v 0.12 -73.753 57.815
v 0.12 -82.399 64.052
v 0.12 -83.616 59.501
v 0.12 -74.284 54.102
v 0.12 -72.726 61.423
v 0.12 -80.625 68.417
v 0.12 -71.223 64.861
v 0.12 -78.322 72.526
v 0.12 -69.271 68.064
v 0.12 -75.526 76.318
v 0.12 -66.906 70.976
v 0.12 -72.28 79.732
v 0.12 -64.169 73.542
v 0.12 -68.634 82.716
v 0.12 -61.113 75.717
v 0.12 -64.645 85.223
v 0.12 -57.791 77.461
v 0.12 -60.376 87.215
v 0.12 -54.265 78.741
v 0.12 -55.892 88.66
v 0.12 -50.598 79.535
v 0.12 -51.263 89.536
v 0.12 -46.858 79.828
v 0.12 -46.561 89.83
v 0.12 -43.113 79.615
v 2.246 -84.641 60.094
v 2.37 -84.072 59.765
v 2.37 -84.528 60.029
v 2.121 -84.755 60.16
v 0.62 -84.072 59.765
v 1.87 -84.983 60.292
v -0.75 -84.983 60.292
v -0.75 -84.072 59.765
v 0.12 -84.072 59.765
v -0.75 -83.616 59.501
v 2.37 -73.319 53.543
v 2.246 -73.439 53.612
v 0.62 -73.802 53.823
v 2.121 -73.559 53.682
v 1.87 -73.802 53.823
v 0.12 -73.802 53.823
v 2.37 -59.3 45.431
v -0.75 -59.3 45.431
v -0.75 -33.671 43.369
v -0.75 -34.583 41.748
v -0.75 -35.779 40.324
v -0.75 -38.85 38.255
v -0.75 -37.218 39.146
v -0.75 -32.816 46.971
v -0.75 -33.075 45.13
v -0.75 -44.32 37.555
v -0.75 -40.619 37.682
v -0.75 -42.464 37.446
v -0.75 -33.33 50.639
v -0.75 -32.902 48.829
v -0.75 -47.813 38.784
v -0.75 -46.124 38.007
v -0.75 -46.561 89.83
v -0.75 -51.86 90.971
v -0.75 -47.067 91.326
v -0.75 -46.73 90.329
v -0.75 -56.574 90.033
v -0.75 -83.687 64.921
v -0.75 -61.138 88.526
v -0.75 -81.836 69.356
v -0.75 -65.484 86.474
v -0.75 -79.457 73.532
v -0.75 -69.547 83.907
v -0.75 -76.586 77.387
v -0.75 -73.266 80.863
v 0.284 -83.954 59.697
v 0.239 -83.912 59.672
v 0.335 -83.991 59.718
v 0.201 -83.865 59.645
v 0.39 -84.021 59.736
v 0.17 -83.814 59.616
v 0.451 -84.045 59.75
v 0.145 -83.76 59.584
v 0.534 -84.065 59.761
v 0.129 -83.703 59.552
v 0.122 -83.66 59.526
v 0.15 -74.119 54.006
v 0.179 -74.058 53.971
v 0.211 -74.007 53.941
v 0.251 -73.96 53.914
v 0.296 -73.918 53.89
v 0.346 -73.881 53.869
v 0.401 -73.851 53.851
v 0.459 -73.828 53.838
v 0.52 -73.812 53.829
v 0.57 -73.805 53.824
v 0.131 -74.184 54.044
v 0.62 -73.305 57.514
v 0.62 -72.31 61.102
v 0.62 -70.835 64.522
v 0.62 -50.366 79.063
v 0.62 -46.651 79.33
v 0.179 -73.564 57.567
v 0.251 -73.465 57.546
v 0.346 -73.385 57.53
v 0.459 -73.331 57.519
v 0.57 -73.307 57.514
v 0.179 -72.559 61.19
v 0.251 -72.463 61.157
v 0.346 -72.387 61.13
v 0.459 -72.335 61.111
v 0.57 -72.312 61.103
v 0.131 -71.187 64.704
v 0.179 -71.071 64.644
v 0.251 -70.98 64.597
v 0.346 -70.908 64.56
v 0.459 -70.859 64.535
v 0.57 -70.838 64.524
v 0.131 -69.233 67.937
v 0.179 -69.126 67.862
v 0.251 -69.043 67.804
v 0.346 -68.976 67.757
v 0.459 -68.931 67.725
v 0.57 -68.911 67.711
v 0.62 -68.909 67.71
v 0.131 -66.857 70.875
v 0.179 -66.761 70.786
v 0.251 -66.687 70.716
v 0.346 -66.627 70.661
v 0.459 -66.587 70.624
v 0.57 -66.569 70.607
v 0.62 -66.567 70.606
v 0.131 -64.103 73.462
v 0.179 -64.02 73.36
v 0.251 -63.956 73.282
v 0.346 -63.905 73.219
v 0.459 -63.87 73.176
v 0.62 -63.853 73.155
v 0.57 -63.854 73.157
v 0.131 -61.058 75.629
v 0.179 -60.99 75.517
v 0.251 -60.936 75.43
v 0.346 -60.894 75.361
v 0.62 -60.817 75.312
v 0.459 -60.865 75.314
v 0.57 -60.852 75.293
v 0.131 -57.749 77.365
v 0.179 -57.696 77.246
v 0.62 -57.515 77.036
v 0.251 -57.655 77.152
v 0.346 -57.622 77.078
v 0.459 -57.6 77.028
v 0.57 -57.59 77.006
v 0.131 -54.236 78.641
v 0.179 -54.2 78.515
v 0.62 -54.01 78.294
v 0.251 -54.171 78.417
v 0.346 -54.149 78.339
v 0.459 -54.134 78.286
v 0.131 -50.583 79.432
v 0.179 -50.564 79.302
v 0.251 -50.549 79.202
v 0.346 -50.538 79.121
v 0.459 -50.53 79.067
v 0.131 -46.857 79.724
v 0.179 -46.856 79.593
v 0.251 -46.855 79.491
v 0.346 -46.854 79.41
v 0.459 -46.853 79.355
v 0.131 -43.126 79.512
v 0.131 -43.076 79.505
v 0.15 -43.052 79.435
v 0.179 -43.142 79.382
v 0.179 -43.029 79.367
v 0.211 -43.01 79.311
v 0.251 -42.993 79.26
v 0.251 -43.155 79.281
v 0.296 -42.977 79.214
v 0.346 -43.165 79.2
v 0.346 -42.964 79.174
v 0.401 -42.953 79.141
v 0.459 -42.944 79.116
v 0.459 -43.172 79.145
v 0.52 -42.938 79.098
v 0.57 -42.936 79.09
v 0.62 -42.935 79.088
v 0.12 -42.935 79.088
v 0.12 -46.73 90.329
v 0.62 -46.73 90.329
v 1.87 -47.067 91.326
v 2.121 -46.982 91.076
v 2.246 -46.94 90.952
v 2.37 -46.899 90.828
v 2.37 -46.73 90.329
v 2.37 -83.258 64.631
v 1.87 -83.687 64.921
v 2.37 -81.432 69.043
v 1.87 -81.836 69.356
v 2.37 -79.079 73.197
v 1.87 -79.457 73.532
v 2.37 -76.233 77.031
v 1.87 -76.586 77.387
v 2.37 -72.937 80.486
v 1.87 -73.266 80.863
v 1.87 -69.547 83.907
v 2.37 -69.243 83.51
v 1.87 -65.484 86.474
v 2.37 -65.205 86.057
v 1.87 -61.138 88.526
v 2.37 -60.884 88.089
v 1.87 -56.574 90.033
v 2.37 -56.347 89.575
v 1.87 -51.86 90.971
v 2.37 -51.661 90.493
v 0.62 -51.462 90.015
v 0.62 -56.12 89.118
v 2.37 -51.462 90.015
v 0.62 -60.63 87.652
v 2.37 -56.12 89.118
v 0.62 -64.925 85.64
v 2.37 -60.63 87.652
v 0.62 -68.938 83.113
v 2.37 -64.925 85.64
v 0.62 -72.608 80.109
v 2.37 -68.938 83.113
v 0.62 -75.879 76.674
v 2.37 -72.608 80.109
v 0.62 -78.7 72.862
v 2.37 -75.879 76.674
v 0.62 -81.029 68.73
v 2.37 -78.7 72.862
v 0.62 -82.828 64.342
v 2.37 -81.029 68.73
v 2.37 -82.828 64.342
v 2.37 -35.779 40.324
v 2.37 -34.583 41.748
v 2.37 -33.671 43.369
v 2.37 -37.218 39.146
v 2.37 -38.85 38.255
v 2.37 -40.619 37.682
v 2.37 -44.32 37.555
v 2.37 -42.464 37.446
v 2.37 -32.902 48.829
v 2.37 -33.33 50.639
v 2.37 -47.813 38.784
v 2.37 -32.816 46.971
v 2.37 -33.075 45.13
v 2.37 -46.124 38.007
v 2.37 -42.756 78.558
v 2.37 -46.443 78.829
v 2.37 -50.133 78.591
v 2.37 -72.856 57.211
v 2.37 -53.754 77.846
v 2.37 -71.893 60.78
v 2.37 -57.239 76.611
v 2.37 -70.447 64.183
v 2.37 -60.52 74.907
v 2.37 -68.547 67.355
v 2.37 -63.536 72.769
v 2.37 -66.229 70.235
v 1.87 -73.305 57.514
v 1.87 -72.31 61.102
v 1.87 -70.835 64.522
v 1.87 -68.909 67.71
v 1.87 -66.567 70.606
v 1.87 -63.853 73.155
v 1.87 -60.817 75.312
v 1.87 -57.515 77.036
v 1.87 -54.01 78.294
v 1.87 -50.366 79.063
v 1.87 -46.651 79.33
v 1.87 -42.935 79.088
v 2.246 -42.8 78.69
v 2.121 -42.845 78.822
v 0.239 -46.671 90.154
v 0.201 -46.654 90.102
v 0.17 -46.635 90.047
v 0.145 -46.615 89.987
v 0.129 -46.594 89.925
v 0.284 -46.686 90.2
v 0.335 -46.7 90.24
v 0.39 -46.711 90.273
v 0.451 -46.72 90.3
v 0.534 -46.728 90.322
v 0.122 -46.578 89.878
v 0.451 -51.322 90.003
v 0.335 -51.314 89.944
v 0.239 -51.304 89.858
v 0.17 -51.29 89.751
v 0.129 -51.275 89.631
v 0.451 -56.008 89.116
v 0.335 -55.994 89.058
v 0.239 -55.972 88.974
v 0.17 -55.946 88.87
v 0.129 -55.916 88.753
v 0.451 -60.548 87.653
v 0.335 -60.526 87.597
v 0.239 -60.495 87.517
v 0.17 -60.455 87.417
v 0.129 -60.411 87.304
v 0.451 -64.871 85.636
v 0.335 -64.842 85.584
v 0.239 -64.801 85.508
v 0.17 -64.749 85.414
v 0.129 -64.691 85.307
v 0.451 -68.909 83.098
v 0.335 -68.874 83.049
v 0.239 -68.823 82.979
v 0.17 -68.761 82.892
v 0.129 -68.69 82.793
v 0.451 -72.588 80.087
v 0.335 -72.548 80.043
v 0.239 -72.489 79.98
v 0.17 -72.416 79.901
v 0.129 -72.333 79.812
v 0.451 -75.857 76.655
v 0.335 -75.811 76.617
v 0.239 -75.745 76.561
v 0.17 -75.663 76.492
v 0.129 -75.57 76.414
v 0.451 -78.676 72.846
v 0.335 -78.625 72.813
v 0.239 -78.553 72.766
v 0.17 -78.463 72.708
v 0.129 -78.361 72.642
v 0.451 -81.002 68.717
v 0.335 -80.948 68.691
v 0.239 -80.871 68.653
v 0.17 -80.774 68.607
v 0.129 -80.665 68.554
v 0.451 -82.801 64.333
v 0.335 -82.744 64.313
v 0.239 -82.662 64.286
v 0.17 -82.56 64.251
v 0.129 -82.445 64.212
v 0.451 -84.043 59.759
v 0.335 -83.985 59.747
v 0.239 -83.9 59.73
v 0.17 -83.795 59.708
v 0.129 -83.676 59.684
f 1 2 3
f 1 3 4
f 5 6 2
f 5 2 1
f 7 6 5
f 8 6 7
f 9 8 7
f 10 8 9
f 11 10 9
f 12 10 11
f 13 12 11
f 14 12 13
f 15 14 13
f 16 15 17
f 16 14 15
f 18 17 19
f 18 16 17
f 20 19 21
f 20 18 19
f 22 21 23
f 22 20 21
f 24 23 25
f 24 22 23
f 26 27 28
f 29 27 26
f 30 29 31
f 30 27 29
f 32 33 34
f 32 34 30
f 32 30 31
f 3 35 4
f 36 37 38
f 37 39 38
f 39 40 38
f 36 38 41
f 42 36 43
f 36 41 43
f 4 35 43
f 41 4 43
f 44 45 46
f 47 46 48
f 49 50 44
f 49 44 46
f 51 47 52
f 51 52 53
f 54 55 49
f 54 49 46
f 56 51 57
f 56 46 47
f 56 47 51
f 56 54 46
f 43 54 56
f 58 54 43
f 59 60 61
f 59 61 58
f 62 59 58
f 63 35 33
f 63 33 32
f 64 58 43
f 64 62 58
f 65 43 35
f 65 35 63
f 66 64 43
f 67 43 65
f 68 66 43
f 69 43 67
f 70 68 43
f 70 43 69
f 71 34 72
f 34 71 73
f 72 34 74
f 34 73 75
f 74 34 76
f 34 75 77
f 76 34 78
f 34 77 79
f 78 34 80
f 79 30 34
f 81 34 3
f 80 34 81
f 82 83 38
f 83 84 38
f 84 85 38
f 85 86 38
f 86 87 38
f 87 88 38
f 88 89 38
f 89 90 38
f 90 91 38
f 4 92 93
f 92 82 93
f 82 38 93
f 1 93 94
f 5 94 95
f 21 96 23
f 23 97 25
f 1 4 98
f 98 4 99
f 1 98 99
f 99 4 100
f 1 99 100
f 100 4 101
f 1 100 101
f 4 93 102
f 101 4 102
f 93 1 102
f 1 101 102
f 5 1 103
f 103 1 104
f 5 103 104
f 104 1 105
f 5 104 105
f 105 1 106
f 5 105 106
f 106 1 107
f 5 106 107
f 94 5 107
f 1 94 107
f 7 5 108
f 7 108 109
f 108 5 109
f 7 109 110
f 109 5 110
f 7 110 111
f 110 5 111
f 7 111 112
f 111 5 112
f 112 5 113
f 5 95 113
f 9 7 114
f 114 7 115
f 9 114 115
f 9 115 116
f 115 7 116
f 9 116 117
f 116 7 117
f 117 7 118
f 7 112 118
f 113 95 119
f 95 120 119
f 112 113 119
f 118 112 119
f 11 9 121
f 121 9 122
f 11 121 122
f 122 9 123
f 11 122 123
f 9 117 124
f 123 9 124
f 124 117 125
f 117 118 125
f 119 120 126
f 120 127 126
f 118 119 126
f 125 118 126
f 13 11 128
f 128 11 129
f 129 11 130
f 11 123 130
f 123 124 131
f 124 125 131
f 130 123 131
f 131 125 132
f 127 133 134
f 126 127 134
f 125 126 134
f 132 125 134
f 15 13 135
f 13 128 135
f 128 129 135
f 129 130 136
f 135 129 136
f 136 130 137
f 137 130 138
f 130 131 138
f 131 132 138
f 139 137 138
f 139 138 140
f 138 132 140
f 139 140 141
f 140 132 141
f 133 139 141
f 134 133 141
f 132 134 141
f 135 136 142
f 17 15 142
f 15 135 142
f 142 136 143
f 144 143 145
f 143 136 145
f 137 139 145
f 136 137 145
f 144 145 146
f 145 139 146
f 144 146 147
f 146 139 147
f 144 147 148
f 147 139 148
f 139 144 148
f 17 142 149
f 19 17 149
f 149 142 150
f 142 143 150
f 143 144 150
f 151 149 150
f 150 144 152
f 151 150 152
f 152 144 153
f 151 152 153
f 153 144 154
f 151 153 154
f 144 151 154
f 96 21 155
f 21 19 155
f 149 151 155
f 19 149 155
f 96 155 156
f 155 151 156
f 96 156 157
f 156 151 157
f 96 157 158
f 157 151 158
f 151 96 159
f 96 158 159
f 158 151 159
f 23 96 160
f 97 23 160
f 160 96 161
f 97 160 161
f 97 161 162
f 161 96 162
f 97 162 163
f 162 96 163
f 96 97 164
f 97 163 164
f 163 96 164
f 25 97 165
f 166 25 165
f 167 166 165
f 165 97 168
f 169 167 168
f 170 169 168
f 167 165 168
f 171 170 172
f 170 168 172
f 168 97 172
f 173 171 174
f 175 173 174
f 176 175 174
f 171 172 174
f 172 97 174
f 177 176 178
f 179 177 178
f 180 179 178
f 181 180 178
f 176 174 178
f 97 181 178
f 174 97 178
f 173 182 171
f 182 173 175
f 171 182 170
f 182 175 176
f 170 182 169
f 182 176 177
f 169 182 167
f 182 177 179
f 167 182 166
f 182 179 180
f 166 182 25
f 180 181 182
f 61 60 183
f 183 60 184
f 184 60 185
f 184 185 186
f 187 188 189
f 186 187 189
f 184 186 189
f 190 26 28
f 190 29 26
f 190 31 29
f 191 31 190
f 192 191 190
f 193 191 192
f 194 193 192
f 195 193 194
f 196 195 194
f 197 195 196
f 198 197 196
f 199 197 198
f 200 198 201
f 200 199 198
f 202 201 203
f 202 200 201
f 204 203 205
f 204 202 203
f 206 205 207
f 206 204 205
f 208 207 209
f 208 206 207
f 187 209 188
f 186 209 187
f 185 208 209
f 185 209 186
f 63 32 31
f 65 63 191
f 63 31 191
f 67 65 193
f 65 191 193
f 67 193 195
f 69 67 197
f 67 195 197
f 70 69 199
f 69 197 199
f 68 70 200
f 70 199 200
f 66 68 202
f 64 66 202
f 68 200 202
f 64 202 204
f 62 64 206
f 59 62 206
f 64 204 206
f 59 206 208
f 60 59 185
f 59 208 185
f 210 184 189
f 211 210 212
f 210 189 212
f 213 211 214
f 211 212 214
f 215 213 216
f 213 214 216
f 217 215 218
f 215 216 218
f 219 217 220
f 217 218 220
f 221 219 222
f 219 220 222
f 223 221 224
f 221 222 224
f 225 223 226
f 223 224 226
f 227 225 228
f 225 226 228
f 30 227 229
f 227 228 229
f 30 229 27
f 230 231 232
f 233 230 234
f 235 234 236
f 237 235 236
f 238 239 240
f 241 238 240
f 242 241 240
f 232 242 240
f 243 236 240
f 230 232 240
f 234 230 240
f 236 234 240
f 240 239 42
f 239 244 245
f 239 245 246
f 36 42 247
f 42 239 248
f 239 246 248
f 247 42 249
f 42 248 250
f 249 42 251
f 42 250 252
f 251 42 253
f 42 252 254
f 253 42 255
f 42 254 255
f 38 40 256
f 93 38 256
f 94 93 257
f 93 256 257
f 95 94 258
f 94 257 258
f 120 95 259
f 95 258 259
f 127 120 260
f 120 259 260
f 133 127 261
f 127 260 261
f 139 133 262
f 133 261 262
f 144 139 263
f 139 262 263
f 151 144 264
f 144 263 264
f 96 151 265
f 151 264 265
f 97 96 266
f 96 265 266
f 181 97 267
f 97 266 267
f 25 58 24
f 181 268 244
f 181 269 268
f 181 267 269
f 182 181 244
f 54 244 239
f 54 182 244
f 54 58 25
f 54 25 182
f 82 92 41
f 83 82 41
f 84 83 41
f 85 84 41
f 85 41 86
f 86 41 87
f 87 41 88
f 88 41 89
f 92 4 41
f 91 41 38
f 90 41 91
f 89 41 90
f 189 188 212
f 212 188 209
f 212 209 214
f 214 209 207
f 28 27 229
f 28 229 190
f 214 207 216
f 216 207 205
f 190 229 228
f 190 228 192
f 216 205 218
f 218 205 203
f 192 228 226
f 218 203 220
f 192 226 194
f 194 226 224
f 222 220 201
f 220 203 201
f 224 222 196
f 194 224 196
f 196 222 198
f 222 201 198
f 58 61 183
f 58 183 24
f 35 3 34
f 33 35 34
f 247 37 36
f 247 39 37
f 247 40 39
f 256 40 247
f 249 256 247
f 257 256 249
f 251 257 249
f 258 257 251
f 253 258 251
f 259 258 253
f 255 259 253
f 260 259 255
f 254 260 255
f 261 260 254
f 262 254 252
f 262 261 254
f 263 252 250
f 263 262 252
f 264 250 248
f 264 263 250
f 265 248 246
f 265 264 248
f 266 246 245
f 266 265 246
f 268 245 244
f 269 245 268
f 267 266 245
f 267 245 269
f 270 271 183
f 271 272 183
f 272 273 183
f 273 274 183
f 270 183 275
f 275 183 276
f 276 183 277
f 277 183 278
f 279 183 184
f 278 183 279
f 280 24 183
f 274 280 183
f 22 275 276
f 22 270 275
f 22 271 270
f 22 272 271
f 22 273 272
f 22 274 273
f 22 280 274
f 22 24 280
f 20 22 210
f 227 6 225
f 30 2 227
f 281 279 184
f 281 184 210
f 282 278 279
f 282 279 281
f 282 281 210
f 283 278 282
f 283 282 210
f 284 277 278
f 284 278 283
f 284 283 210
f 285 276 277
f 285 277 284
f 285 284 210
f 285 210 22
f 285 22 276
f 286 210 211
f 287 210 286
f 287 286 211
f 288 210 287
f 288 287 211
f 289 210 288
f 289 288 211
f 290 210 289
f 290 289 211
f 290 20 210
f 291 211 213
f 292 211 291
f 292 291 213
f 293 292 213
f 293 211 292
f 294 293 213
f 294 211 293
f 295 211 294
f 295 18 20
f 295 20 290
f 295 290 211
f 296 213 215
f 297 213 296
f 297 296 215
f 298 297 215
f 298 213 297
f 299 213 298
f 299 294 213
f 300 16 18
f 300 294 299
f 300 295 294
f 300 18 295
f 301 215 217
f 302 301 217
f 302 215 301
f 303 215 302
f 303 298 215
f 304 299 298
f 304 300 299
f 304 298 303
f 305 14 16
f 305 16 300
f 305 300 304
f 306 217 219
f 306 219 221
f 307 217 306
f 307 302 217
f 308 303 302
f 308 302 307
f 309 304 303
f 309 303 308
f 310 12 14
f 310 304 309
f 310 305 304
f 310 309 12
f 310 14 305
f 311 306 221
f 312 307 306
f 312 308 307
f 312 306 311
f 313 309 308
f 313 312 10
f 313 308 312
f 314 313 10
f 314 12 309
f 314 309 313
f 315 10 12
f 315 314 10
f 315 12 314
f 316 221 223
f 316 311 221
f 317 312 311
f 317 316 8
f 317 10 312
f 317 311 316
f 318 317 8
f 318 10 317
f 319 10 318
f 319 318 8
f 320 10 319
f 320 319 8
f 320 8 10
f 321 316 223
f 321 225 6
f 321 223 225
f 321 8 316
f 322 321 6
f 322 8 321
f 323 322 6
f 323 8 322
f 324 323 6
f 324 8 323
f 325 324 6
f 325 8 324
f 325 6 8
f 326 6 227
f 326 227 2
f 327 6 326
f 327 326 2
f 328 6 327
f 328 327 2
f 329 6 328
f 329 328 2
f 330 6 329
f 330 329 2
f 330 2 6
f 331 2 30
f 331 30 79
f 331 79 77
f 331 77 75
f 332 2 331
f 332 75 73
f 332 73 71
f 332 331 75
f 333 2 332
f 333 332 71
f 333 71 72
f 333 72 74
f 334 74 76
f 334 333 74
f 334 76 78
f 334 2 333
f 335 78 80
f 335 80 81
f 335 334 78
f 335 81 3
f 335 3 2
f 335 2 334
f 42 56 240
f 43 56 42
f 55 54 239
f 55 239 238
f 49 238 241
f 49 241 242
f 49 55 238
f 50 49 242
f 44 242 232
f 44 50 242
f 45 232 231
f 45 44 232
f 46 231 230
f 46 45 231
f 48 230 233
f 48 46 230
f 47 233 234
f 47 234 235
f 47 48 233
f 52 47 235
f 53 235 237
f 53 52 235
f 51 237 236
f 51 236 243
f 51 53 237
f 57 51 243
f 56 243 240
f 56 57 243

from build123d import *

# Parameters (mm, degrees)
F1_DEPTH     = 2.37
F3_DEPTH     = 2.37
F5_DEPTH     = 2.25
F6_DEPTH     = 0.75
F7_SIZE      = 0.5
F8_T4_ANGLE  = 81.836383008
F8_T10_ANGLE = 99.1168662244
F10_DEPTH    = 3.12


# Not quite as in the source:
# - a fillet or chamfer that OpenCascade refuses, or shapes differently, is made with other operations: its cross-section is extruded or revolved along the edge and cut away or added


with BuildPart() as f1:
    # F0 (on Right) → F1 (new body)
    with BuildSketch(Plane.YZ):
        with BuildLine():
            ThreePointArc((-46.5614527995, 89.8296507657), (-59.272592692, 87.6283434753), (-70.5032497848, 81.2808106933))
            Line((-70.5032497848, 81.2808106933), (-46.5614527995, 52.0296507657))
            Line((-46.5614527995, 52.0296507657), (-42.2863249385, 46.8064651858))
            ThreePointArc((-42.2863249385, 46.8064651858), (-37.3697308445, 54.2738686288), (-37.5751261635, 63.2121472344))
            Line((-37.5751261635, 63.2121472344), (-46.5614527995, 89.8296507657))
        make_face()
        with BuildLine():
            Line((-46.5614527995, 52.0296507657), (-70.5032497848, 81.2808106933))
            ThreePointArc((-70.5032497848, 81.2808106933), (-78.9453750126, 71.5263577209), (-83.6157032002, 59.501098232))
            Line((-83.6157032002, 59.501098232), (-59.2995451707, 45.4309163095))
            ThreePointArc((-59.2995451707, 45.4309163095), (-50.5782061954, 43.4628568222), (-42.2863249385, 46.8064651858))
            Line((-42.2863249385, 46.8064651858), (-46.5614527995, 52.0296507657))
        make_face()
    extrude(amount=F1_DEPTH)

    # F2 (on face) → F3 (join)
    with BuildSketch(Plane(origin=(0, 0, 0), x_dir=(0, -1, 0), z_dir=(-1, 0, 0))):
        with BuildLine():
            ThreePointArc((84.0721339402, 59.7652050675), (70.8199402211, 81.6677307982), (46.7301322311, 90.3292793181))
            Line((46.7301322311, 90.3292793181), (46.5614527995, 89.8296507657))
            ThreePointArc((46.5614527995, 89.8296507657), (70.5032497848, 81.2808106933), (83.6157032002, 59.501098232))
            Line((83.6157032002, 59.501098232), (84.0721339402, 59.7652050675))
        make_face()
        with BuildLine():
            ThreePointArc((84.9830454985, 60.2922904452), (71.4533210937, 82.4415710079), (47.0667704776, 91.3264019551))
            Line((47.0667704776, 91.3264019551), (46.7301322311, 90.3292793181))
            ThreePointArc((46.7301322311, 90.3292793181), (70.8199402211, 81.6677307982), (84.0721339402, 59.7652050675))
            Line((84.0721339402, 59.7652050675), (84.9830454985, 60.2922904452))
        make_face()
    extrude(amount=-F3_DEPTH)

    # F4 (on face) → F5 (cut)
    with BuildSketch(Plane.YZ.offset(2.37)):
        with BuildLine():
            ThreePointArc((-73.802497152, 53.8228330154), (-63.8527506222, 73.1554884912), (-42.9348652938, 79.0876969454))
            Line((-42.9348652938, 79.0876969454), (-46.7301322311, 90.3292793181))
            ThreePointArc((-46.7301322311, 90.3292793181), (-70.8199402211, 81.6677307982), (-84.0721339402, 59.7652050675))
            Line((-84.0721339402, 59.7652050675), (-73.802497152, 53.8228330154))
        make_face()
    extrude(amount=-F5_DEPTH, mode=Mode.SUBTRACT)

    # F6 (add): a face of the model
    f6_faces = [f1.faces().sort_by_distance(p)[0] for p in [
        (0, -58.3598378742, 66.4444605195),
    ]]
    extrude(f6_faces, amount=F6_DEPTH)

    # F7
    f7_edges = [f1.edges().sort_by_distance(p)[0] for p in [
        (2.37, -71.453321, 82.441571),
        (2.37, -63.852751, 73.155488),
    ]]
    chamfer(f7_edges, length=F7_SIZE)

    # F8: fillet of radius 0.5 on 2 edges, made by hand


with BuildPart() as f8_tool2:
    # F8_s3 → F8_t4 (revolve)
    with BuildSketch(Plane(origin=(0, -47.9930028953, 1.3558158365), x_dir=(1, 0, 0), z_dir=(0, 0.9996011995, -0.0282390152))):
        with BuildLine():
            ThreePointArc((0.62, -88.9940517429), (0.2664466094, -88.8476051335), (0.12, -88.4940517429))
            Line((0.12, -88.4940517429), (0.12, -88.9940517429))
            Line((0.12, -88.9940517429), (0.62, -88.9940517429))
        make_face()
    revolve(axis=Axis((0.12, -46.5614527995, 52.0296507657), (1, 0, 0)), revolution_arc=F8_T4_ANGLE)

    split(bisect_by=Plane(origin=(0, 4.8196318055, 8.3293115378), x_dir=(1, 0, 0), z_dir=(0, 0.5008338095, 0.8655434681)), keep=Keep.TOP)

    split(bisect_by=Plane(origin=(0, -14.5730530493, -4.9200036596), x_dir=(1, 0, 0), z_dir=(0, -0.947460791, -0.3198719268)), keep=Keep.TOP)


with BuildPart() as f1_1:
    add(f1.part)

    # F8_t1: union F8_tool2
    add(f8_tool2.part)


with BuildPart() as f8_tool8:
    # F8_s9 → F8_t10 (revolve)
    with BuildSketch(Plane(origin=(0, 1.0178886406, 51.0815497106), x_dir=(1, 0, 0), z_dir=(0, -0.0199227826, -0.9998015217))):
        with BuildLine():
            ThreePointArc((0.12, 75.388786783), (0.2664466094, 75.0352333924), (0.62, 74.888786783))
            Line((0.62, 74.888786783), (0.12, 74.888786783))
            Line((0.12, 74.888786783), (0.12, 75.388786783))
        make_face()
    revolve(axis=Axis((0.12, -46.5614527995, 52.0296507657), (-1, 0, 0)), revolution_arc=F8_T10_ANGLE)

    split(bisect_by=Plane(origin=(0, 4.8196318055, 8.3293115378), x_dir=(1, 0, 0), z_dir=(0, 0.5008338095, 0.8655434681)), keep=Keep.TOP)

    split(bisect_by=Plane(origin=(0, -14.5730530493, -4.9200036596), x_dir=(1, 0, 0), z_dir=(0, -0.947460791, -0.3198719268)), keep=Keep.TOP)


with BuildPart() as f1_2:
    add(f1_1.part)

    # F8_t7: union F8_tool8
    add(f8_tool8.part)

    # F9 (on face) → F10 (join)
    with BuildSketch(Plane(origin=(-0.75, 0, 0), x_dir=(0, -1, 0), z_dir=(-1, 0, 0))):
        with BuildLine():
            ThreePointArc((59.2995451707, 45.4309163095), (42.2863249385, 46.8064651858), (37.5751261635, 63.2121472344))
            Line((37.5751261635, 63.2121472344), (33.3301843859, 50.6386277829))
            ThreePointArc((33.3301843859, 50.6386277829), (36.4709835693, 39.7015064172), (47.8131303907, 38.784473833))
            Line((47.8131303907, 38.784473833), (59.2995451707, 45.4309163095))
        make_face()
    extrude(amount=-F10_DEPTH)


solid = f1_2.part
